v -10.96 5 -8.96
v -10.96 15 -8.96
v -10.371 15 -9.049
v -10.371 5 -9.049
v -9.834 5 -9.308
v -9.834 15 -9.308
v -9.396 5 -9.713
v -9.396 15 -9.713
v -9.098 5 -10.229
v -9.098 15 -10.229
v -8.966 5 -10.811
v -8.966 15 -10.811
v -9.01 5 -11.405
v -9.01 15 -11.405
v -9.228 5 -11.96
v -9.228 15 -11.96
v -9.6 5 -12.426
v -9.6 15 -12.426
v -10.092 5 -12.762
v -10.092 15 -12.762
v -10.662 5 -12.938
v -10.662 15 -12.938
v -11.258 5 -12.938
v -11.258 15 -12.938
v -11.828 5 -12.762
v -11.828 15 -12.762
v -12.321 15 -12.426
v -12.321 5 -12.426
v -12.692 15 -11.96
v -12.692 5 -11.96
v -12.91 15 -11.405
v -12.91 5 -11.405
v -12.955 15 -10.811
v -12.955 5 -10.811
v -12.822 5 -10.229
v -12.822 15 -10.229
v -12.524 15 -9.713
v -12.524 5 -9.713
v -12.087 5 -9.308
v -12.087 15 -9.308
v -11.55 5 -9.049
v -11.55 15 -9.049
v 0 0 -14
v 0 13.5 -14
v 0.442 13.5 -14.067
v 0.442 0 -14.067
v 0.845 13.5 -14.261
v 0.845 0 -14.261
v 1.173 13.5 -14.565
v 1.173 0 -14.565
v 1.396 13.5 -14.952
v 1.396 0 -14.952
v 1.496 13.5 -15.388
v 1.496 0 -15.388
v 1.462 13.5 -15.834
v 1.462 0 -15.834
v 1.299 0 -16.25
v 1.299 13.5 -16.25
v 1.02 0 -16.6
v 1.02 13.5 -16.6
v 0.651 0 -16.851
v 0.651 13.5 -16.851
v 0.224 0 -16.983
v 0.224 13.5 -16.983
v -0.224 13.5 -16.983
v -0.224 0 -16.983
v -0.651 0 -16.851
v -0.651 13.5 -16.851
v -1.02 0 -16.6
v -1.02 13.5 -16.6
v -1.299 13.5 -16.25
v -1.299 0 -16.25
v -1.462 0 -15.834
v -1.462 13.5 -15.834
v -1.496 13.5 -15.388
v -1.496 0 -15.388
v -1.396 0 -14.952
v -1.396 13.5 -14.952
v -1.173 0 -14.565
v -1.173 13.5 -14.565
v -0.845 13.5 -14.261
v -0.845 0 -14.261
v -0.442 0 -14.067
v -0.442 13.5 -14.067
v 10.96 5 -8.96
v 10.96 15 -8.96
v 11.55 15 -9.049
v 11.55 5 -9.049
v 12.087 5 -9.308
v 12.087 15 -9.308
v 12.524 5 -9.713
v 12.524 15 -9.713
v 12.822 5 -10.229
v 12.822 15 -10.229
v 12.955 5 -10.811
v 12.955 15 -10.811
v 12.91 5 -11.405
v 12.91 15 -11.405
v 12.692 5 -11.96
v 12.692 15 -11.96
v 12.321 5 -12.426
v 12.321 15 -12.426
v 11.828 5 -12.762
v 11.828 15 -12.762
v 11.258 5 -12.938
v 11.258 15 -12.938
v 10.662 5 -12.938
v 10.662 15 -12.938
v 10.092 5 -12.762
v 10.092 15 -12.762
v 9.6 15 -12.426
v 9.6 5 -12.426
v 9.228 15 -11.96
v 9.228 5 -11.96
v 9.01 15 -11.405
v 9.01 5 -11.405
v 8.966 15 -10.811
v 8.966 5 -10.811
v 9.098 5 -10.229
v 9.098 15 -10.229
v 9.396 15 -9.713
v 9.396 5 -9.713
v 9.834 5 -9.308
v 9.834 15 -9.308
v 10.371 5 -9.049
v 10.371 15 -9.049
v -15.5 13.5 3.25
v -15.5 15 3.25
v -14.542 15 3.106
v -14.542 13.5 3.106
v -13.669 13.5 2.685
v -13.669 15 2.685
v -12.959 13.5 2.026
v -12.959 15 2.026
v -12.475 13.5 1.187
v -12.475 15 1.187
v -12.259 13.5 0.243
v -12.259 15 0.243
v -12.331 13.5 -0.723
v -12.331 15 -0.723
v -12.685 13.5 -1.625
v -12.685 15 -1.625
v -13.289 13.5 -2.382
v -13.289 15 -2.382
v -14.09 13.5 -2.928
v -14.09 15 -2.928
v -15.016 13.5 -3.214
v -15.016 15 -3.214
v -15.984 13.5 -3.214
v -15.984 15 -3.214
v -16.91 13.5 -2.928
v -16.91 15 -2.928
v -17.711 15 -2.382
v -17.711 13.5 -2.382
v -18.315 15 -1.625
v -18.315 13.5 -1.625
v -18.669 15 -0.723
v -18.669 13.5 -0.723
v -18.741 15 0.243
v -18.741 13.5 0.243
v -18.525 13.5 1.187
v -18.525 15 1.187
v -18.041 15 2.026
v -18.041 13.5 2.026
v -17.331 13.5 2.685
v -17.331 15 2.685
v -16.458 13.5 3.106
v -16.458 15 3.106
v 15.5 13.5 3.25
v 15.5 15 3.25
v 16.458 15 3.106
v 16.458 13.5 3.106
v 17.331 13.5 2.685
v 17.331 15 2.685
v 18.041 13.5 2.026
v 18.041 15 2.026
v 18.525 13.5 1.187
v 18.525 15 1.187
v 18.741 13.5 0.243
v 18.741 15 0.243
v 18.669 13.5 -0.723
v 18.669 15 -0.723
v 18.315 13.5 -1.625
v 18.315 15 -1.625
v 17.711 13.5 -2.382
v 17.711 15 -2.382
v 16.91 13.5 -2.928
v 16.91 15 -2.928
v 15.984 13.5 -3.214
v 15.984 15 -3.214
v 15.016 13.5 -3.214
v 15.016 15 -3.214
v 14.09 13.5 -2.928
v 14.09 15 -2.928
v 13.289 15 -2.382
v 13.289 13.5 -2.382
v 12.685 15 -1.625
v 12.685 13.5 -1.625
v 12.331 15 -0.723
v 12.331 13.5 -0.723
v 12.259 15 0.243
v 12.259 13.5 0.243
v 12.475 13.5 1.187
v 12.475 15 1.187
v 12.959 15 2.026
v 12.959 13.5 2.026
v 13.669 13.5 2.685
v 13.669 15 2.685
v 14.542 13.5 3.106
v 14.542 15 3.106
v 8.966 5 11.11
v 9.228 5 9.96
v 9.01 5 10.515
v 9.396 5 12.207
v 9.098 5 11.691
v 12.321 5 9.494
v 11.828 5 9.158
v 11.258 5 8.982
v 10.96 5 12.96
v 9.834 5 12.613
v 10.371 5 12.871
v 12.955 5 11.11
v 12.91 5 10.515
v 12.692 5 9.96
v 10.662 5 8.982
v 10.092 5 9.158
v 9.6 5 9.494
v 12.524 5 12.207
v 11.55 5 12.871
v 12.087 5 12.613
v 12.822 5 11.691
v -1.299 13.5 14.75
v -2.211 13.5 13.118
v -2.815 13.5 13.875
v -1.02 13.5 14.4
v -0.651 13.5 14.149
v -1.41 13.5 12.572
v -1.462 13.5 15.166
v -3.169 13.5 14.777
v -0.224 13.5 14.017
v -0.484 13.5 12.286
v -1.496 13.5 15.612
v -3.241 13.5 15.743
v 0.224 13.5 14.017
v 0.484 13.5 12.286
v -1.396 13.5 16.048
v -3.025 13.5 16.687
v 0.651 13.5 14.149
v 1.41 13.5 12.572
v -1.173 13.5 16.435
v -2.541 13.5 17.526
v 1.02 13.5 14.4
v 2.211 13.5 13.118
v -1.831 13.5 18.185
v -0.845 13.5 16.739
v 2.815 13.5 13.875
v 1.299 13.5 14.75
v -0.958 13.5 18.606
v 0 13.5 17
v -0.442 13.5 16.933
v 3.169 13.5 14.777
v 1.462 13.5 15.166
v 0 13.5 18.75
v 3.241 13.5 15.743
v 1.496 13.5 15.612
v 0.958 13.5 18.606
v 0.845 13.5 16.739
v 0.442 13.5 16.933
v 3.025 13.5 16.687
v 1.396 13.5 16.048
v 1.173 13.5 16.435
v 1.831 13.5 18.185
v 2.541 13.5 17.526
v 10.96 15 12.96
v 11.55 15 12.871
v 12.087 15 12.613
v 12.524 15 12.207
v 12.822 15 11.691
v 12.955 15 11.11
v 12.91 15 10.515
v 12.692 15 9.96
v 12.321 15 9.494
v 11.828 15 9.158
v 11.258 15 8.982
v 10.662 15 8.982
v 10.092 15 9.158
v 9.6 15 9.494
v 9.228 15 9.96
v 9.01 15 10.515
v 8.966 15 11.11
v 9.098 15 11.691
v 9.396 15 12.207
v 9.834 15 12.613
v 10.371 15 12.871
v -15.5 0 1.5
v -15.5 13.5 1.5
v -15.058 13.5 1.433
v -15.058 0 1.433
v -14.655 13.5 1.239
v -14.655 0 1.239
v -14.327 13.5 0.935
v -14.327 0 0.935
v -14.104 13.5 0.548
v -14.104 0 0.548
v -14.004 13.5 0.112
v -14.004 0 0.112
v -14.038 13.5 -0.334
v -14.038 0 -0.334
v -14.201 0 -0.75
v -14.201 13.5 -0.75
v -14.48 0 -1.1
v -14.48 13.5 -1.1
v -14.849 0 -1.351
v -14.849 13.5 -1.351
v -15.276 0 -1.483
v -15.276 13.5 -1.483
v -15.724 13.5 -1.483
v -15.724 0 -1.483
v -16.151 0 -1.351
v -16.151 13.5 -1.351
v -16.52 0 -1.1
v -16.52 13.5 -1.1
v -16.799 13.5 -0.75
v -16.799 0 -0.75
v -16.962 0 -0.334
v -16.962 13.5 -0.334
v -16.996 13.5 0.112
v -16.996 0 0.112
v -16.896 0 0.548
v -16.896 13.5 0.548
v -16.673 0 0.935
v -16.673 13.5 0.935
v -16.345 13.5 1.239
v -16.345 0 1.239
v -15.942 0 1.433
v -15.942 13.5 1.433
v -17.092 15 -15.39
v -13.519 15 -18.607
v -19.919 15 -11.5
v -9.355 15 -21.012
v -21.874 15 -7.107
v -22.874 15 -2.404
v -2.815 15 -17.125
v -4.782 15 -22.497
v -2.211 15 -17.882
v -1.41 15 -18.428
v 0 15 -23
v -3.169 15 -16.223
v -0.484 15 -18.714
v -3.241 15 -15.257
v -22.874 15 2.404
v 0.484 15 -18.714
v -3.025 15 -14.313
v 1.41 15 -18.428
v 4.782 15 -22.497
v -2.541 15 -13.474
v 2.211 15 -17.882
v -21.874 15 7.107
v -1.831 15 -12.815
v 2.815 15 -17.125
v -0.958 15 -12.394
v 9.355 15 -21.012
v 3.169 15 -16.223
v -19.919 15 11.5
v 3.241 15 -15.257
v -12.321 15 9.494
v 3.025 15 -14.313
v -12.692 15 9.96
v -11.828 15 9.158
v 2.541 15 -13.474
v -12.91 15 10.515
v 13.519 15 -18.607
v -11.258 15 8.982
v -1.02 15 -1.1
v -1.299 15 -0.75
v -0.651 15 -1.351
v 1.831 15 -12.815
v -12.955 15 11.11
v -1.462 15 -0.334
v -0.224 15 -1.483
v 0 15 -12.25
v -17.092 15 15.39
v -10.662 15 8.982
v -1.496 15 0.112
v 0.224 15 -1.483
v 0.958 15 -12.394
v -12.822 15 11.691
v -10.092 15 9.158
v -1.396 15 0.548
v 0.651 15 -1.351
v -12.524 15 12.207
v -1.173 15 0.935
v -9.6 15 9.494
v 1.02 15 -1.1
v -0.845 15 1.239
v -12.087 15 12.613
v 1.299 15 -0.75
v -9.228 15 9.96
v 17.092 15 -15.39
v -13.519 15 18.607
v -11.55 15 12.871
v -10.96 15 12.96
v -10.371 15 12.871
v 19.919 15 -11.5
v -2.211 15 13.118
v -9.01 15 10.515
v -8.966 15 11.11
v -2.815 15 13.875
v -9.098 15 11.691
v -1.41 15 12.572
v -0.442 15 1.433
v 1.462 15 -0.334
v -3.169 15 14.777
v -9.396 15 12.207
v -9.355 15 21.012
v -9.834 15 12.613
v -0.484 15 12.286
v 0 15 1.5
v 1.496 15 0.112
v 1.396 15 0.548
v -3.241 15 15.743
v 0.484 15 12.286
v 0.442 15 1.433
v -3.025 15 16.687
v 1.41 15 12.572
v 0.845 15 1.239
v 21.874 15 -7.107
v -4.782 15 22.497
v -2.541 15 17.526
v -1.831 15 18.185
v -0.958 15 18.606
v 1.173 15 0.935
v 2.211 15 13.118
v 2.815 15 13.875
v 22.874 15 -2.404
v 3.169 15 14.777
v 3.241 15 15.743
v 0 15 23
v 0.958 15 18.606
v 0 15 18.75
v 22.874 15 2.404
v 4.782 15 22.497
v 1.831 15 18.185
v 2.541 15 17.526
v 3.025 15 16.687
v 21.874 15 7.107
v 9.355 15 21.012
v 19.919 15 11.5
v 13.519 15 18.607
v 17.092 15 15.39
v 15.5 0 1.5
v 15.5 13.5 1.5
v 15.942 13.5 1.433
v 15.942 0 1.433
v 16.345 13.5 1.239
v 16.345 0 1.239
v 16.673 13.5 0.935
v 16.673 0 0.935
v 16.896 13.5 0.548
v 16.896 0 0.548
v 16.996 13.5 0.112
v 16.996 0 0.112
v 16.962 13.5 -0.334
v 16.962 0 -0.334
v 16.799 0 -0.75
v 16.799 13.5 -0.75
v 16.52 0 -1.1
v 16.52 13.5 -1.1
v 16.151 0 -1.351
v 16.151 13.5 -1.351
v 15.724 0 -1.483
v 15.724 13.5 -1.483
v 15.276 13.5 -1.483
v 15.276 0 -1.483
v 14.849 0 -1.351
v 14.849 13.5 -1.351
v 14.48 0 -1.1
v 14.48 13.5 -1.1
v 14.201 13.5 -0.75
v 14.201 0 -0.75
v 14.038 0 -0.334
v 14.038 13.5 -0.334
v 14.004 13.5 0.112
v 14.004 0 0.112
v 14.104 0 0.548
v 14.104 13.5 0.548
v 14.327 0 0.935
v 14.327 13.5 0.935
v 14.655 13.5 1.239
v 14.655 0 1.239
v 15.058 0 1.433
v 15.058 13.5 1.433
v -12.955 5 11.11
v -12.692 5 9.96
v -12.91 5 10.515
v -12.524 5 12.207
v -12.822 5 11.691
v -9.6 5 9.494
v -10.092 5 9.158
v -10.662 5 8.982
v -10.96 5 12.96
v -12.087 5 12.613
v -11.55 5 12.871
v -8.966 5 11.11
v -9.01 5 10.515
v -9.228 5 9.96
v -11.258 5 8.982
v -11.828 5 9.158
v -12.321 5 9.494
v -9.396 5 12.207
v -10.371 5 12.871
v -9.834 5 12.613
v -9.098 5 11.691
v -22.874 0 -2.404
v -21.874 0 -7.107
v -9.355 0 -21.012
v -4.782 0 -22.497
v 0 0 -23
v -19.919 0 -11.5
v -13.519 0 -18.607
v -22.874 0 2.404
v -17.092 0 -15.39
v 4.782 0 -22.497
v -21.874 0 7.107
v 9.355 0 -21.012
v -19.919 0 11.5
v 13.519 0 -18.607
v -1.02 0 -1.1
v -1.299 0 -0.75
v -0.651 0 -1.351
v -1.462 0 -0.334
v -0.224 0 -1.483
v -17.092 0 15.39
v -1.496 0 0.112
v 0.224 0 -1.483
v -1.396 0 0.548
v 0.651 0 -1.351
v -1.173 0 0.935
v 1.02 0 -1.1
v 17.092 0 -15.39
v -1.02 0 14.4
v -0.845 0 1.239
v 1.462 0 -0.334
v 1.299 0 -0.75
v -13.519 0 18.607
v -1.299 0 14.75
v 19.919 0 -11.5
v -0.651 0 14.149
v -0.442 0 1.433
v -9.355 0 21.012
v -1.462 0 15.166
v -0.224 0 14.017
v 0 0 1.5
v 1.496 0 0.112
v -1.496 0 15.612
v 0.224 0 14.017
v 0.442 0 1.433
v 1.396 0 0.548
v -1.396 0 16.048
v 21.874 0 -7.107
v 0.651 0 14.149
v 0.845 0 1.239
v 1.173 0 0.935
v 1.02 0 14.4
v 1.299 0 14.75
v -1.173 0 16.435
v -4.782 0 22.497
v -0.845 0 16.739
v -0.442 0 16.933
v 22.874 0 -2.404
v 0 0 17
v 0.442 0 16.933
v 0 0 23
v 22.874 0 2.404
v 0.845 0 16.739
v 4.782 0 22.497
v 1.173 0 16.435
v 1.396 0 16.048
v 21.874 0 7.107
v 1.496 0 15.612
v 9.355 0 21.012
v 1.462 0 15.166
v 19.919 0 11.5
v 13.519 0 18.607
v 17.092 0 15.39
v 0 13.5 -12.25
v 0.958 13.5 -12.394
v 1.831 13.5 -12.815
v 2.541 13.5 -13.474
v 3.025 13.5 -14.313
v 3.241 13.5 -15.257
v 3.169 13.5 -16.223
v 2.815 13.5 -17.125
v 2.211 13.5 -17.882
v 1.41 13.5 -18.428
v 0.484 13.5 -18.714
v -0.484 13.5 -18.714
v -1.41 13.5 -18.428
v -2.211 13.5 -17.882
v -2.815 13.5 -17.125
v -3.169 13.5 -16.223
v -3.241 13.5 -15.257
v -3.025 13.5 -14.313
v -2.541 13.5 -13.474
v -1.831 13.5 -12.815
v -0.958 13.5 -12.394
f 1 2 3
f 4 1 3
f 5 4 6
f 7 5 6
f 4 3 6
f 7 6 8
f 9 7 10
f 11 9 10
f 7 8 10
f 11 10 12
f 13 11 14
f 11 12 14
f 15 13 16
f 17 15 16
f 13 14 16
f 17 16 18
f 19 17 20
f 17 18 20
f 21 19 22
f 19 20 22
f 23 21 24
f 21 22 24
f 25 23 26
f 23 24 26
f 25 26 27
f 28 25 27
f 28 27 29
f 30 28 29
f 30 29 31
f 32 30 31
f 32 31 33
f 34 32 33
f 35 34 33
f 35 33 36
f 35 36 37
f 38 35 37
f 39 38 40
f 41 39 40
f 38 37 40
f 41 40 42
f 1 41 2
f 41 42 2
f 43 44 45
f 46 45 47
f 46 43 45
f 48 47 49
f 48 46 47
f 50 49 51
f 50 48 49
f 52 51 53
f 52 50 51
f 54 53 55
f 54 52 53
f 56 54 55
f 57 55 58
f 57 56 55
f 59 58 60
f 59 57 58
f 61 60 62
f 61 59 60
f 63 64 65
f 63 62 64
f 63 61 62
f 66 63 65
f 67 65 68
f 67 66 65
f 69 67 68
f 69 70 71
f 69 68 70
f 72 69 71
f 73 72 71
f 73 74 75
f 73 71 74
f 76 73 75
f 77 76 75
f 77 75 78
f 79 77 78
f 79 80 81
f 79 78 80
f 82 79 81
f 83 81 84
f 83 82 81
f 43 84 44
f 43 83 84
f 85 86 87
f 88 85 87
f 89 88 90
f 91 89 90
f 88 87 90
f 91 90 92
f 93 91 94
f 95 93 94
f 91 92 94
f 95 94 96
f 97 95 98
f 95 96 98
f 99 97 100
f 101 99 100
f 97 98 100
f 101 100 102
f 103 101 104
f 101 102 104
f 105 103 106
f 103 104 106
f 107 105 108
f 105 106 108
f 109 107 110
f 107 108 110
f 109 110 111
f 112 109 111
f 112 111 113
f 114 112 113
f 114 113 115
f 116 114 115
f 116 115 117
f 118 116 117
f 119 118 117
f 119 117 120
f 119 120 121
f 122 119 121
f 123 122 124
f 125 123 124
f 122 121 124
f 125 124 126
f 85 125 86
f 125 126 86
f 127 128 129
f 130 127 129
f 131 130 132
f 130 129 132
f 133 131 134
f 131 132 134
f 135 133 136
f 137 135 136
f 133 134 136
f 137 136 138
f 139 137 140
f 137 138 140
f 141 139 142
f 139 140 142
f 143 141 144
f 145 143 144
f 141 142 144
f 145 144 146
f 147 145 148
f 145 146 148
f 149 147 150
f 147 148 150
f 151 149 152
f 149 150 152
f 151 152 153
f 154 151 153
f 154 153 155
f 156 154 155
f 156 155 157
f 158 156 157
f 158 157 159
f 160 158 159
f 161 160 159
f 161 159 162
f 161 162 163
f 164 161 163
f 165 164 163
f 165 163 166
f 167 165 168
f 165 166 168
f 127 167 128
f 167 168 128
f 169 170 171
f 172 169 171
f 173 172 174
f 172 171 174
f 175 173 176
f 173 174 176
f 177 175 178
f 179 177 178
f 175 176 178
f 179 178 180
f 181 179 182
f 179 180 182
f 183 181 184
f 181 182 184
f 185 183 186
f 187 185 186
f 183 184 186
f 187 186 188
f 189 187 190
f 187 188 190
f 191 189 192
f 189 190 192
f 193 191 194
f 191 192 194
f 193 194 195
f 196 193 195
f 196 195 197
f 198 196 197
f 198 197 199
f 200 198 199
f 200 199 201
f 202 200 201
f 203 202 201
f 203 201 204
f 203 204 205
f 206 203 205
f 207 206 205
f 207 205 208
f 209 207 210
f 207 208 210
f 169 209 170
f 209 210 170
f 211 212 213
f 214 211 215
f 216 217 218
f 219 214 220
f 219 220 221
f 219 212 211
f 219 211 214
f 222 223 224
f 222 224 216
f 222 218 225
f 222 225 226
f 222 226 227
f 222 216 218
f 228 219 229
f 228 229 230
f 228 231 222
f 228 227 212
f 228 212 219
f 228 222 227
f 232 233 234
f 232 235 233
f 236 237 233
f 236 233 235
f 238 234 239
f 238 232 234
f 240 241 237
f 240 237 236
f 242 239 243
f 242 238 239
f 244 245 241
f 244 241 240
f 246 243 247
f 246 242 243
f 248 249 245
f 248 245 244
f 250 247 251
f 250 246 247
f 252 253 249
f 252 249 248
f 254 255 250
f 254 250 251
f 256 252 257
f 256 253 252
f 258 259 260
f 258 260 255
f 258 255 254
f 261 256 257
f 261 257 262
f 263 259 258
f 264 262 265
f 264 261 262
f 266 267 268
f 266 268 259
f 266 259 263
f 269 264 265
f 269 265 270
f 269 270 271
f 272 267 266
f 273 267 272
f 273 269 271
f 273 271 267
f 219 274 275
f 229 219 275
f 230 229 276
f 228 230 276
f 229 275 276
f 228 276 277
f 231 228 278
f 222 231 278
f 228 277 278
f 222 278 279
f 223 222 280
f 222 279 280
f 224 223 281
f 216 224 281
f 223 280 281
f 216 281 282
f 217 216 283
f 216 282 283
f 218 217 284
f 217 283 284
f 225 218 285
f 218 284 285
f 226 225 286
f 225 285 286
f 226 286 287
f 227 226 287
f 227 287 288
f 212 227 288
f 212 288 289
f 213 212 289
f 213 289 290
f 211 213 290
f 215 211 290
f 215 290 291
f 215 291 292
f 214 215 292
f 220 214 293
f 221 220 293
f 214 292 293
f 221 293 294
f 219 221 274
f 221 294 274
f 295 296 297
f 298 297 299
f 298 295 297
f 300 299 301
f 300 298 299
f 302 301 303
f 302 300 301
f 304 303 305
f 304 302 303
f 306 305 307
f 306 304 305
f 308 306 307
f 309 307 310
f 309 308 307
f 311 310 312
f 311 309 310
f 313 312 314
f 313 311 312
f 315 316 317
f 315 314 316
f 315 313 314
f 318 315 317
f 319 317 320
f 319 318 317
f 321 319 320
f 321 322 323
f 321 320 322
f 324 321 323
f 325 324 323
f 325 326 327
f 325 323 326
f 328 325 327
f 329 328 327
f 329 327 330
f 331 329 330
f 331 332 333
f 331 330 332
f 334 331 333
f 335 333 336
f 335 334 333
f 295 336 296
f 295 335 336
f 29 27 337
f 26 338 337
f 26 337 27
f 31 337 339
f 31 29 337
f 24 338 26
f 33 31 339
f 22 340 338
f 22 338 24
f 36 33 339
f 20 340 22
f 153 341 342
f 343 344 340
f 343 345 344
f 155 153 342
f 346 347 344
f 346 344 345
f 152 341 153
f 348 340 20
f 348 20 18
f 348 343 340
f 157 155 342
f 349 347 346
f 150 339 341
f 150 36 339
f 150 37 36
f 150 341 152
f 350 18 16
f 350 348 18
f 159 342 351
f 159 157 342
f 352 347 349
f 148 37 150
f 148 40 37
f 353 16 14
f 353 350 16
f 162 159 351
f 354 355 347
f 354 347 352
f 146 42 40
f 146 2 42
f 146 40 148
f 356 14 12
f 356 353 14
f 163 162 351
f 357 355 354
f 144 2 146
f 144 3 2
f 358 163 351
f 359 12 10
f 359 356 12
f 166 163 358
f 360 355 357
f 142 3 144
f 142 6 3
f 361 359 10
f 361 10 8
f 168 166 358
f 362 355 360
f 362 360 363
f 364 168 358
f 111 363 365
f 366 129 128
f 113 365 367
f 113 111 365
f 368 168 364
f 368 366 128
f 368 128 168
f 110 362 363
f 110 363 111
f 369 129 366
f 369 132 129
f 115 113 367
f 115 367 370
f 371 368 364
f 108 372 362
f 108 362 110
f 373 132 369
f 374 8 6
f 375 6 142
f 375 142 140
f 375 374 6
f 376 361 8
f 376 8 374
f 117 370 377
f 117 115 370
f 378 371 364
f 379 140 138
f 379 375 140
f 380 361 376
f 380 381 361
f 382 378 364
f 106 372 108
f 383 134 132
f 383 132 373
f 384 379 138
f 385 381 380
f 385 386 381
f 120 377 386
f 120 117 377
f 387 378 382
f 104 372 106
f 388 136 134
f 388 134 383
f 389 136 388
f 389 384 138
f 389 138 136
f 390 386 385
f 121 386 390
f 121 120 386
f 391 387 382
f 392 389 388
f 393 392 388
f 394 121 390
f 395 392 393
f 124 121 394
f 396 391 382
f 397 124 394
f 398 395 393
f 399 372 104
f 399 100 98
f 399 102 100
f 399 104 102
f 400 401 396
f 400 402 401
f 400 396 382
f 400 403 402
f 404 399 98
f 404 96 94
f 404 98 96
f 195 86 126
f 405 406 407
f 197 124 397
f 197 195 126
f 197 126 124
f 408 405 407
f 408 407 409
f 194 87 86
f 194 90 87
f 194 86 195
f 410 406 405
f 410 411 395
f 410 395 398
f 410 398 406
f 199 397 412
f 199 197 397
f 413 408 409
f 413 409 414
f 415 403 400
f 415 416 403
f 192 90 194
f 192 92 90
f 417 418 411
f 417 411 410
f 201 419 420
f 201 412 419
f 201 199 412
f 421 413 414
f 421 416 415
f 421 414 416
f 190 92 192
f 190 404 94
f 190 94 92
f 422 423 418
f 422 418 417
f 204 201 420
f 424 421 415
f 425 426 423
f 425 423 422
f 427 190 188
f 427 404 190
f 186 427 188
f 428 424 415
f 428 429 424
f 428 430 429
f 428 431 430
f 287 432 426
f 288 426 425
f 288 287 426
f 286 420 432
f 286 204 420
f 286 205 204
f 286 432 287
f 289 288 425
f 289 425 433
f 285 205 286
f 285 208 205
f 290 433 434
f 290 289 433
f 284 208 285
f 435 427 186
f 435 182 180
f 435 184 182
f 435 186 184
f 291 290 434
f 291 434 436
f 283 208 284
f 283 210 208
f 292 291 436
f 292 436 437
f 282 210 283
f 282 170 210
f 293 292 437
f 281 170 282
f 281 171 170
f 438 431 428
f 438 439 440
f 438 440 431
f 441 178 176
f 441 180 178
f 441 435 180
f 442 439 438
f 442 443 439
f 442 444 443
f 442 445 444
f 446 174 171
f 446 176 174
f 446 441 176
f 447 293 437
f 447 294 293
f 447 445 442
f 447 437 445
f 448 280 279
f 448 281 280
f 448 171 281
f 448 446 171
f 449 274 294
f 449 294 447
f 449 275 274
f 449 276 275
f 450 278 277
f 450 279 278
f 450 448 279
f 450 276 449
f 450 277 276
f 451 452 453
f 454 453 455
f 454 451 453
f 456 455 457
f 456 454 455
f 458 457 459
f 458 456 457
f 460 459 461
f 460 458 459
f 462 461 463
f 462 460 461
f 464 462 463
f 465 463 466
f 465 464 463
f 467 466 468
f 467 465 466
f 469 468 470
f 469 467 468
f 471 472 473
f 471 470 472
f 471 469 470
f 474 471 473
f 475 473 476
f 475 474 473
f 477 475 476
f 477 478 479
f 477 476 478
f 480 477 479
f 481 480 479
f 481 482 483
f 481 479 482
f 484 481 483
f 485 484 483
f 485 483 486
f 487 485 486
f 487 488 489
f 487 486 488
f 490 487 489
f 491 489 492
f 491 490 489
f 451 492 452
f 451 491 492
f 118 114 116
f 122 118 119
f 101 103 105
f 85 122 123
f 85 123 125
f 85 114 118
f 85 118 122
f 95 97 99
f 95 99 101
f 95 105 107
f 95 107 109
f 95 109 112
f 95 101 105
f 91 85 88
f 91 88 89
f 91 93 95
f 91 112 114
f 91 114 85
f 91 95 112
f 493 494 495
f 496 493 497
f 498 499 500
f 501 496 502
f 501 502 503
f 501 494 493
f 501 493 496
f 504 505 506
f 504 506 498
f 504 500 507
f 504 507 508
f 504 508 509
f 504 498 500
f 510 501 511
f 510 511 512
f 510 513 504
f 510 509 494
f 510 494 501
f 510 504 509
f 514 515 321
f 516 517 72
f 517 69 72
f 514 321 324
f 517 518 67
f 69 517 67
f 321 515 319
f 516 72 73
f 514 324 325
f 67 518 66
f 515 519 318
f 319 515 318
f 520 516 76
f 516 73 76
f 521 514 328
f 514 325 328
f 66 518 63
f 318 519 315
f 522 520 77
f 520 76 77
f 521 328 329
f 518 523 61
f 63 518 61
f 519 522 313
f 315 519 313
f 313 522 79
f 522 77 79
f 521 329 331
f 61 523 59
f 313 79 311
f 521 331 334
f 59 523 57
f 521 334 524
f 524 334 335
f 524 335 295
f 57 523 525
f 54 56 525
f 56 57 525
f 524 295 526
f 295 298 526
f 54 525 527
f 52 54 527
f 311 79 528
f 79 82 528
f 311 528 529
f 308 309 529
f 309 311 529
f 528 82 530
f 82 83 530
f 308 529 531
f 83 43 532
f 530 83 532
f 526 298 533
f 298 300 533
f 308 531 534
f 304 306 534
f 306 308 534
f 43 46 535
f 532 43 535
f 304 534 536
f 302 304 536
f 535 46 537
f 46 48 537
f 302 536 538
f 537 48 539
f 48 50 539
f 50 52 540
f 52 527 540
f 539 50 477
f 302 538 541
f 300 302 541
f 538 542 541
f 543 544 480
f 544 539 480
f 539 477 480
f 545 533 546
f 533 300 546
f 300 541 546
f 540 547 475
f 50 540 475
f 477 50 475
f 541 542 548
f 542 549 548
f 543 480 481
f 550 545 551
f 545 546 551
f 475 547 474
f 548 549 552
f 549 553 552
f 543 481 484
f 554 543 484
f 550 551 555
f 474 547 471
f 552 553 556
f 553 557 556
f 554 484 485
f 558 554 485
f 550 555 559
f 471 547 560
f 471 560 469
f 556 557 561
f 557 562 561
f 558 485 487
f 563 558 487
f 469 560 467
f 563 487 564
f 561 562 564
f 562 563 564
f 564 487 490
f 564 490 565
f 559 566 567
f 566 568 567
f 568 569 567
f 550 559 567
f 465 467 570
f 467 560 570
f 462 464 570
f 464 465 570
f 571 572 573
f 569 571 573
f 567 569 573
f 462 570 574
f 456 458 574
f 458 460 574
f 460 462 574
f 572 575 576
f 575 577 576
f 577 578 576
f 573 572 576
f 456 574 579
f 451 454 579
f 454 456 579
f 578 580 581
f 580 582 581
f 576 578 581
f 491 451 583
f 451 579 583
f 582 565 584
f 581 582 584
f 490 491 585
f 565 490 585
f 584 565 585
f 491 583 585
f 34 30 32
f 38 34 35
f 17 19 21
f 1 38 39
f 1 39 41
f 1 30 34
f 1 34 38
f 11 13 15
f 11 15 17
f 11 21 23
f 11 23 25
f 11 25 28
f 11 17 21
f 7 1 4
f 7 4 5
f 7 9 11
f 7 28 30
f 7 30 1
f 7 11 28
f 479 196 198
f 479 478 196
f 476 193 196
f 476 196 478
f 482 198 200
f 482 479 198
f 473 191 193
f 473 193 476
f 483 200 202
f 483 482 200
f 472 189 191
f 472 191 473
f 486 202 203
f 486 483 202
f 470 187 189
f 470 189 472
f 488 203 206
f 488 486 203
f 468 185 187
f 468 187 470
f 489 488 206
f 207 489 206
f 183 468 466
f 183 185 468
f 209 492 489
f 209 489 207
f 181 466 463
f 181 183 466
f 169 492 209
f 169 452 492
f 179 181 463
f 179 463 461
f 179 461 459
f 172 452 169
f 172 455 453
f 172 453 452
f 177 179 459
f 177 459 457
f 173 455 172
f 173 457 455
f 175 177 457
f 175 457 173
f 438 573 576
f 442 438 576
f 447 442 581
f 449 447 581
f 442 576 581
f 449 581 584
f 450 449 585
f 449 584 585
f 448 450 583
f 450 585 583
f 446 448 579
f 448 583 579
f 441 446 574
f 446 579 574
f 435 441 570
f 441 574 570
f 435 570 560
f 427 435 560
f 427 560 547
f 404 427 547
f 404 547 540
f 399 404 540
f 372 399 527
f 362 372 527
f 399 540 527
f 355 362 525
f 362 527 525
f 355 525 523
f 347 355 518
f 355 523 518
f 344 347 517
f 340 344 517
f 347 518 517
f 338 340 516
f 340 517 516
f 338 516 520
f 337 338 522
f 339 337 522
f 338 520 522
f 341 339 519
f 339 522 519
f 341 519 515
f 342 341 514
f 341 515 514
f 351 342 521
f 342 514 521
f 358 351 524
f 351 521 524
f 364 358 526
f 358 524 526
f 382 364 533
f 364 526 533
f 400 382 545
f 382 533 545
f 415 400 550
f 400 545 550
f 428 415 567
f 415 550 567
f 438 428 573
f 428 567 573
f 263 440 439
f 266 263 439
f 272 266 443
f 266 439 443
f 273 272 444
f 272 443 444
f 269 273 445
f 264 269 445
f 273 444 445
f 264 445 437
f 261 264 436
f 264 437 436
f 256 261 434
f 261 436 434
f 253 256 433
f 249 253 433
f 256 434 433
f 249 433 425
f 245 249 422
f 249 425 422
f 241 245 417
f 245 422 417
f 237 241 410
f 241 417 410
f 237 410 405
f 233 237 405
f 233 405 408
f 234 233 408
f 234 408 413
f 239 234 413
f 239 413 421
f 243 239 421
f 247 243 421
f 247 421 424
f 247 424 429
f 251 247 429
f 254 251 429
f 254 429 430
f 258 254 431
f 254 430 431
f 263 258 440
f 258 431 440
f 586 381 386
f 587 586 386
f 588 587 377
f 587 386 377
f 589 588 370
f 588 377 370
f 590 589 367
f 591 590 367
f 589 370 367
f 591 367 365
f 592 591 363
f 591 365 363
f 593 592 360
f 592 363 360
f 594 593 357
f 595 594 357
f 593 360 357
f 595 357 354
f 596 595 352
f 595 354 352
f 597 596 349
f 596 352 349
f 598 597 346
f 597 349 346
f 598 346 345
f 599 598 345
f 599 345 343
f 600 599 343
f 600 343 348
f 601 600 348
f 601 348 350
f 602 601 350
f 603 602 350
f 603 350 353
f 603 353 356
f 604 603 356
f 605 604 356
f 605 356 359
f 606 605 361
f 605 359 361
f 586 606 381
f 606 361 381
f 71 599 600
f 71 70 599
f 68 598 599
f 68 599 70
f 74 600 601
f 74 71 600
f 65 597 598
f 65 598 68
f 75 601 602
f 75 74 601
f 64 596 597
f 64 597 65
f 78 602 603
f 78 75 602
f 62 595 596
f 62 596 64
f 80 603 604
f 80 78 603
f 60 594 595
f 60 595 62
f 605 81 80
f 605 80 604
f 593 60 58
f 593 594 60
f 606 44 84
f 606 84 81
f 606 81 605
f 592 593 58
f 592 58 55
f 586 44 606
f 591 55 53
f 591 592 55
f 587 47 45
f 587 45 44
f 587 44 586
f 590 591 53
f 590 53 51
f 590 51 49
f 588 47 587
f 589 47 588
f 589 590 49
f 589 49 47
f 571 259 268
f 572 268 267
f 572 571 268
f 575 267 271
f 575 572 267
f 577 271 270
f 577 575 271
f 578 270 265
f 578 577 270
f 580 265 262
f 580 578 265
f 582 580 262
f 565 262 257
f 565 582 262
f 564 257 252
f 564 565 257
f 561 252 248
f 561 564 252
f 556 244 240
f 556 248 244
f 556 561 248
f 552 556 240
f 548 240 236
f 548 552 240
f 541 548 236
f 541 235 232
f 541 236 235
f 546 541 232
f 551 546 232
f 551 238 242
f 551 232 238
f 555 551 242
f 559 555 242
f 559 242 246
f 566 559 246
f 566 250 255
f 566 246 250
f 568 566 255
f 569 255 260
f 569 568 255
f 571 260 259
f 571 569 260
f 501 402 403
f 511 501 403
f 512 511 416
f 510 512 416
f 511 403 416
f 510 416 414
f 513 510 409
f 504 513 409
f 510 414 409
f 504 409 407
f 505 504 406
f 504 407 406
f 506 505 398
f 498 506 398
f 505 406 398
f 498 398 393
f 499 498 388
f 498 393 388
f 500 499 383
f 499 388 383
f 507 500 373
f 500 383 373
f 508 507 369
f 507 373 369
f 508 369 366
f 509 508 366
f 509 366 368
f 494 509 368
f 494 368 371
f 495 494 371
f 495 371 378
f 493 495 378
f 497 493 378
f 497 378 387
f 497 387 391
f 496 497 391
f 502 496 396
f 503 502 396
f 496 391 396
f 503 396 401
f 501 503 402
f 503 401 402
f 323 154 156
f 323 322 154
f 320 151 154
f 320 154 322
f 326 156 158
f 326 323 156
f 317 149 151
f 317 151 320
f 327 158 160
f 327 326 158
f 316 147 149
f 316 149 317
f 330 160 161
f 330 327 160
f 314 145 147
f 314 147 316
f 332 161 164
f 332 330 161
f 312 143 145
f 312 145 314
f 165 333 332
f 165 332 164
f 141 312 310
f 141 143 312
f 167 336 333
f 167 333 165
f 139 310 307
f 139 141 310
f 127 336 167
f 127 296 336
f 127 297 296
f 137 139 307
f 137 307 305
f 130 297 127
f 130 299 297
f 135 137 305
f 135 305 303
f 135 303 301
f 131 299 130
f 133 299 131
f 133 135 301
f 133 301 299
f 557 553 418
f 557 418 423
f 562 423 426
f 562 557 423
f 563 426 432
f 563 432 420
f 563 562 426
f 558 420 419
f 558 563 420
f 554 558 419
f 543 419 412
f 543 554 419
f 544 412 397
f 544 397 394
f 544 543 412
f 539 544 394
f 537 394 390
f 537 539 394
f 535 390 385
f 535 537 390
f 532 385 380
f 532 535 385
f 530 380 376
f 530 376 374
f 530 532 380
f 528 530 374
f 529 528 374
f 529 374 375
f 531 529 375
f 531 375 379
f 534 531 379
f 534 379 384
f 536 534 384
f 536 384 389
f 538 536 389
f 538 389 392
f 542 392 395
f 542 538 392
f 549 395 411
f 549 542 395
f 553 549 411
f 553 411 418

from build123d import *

# Parameters (mm, degrees)
SKETCH1_R           = 23
SKETCH1_R_2         = 1.5
BOSS_EXTRUDE1_DEPTH = 15
SKETCH2_R           = 3.25
CUT_EXTRUDE1_DEPTH  = 1.5
SKETCH3_R           = 2
CUT_EXTRUDE2_DEPTH  = 10


with BuildPart() as part:
    # Sketch1 → Boss-Extrude1 (new body)
    with BuildSketch(Plane(origin=(0, 0, 0), x_dir=(1, 0, 0), z_dir=(0, 1, 0))):
        with Locations(Location((0, 0, 0), (0, 0, 270))):
            Circle(SKETCH1_R)
        with Locations(Location((0, 15.5, 0), (0, 0, 270))):
            Circle(SKETCH1_R_2, mode=Mode.SUBTRACT)
        with Locations(Location((15.5, 0, 0), (0, 0, 270))):
            Circle(SKETCH1_R_2, mode=Mode.SUBTRACT)
        with Locations(Location((0, -15.5, 0), (0, 0, 270))):
            Circle(SKETCH1_R_2, mode=Mode.SUBTRACT)
        with Locations(Location((-15.5, 0, 0), (0, 0, 270))):
            Circle(SKETCH1_R_2, mode=Mode.SUBTRACT)
        with Locations(Location((0, 0, 0), (0, 0, 270))):
            Circle(SKETCH1_R_2, mode=Mode.SUBTRACT)
    extrude(amount=BOSS_EXTRUDE1_DEPTH)

    # Sketch2 → Cut-Extrude1 (cut)
    with BuildSketch(Plane(origin=(0, 15, 0), x_dir=(1, 0, 0), z_dir=(0, 1, 0))):
        with Locations(Location((0, 15.5, 0), (0, 0, 270))):
            Circle(SKETCH2_R)
        with Locations(Location((15.5, 0, 0), (0, 0, 270))):
            Circle(SKETCH2_R)
        with Locations(Location((0, -15.5, 0), (0, 0, 270))):
            Circle(SKETCH2_R)
        with Locations(Location((-15.5, 0, 0), (0, 0, 270))):
            Circle(SKETCH2_R)
    extrude(amount=-CUT_EXTRUDE1_DEPTH, mode=Mode.SUBTRACT)

    # Sketch3 → Cut-Extrude2 (cut)
    with BuildSketch(Plane(origin=(0, 15, 0), x_dir=(1, 0, 0), z_dir=(0, 1, 0))):
        with Locations(Location((-10.960155108, 10.960155108, 0), (0, 0, 270))):
            Circle(SKETCH3_R)
        with Locations(Location((10.960155108, 10.960155108, 0), (0, 0, 270))):
            Circle(SKETCH3_R)
        with Locations(Location((10.960155108, -10.960155108, 0), (0, 0, 270))):
            Circle(SKETCH3_R)
        with Locations(Location((-10.960155108, -10.960155108, 0), (0, 0, 270))):
            Circle(SKETCH3_R)
    extrude(amount=-CUT_EXTRUDE2_DEPTH, mode=Mode.SUBTRACT)


solid = part.part
